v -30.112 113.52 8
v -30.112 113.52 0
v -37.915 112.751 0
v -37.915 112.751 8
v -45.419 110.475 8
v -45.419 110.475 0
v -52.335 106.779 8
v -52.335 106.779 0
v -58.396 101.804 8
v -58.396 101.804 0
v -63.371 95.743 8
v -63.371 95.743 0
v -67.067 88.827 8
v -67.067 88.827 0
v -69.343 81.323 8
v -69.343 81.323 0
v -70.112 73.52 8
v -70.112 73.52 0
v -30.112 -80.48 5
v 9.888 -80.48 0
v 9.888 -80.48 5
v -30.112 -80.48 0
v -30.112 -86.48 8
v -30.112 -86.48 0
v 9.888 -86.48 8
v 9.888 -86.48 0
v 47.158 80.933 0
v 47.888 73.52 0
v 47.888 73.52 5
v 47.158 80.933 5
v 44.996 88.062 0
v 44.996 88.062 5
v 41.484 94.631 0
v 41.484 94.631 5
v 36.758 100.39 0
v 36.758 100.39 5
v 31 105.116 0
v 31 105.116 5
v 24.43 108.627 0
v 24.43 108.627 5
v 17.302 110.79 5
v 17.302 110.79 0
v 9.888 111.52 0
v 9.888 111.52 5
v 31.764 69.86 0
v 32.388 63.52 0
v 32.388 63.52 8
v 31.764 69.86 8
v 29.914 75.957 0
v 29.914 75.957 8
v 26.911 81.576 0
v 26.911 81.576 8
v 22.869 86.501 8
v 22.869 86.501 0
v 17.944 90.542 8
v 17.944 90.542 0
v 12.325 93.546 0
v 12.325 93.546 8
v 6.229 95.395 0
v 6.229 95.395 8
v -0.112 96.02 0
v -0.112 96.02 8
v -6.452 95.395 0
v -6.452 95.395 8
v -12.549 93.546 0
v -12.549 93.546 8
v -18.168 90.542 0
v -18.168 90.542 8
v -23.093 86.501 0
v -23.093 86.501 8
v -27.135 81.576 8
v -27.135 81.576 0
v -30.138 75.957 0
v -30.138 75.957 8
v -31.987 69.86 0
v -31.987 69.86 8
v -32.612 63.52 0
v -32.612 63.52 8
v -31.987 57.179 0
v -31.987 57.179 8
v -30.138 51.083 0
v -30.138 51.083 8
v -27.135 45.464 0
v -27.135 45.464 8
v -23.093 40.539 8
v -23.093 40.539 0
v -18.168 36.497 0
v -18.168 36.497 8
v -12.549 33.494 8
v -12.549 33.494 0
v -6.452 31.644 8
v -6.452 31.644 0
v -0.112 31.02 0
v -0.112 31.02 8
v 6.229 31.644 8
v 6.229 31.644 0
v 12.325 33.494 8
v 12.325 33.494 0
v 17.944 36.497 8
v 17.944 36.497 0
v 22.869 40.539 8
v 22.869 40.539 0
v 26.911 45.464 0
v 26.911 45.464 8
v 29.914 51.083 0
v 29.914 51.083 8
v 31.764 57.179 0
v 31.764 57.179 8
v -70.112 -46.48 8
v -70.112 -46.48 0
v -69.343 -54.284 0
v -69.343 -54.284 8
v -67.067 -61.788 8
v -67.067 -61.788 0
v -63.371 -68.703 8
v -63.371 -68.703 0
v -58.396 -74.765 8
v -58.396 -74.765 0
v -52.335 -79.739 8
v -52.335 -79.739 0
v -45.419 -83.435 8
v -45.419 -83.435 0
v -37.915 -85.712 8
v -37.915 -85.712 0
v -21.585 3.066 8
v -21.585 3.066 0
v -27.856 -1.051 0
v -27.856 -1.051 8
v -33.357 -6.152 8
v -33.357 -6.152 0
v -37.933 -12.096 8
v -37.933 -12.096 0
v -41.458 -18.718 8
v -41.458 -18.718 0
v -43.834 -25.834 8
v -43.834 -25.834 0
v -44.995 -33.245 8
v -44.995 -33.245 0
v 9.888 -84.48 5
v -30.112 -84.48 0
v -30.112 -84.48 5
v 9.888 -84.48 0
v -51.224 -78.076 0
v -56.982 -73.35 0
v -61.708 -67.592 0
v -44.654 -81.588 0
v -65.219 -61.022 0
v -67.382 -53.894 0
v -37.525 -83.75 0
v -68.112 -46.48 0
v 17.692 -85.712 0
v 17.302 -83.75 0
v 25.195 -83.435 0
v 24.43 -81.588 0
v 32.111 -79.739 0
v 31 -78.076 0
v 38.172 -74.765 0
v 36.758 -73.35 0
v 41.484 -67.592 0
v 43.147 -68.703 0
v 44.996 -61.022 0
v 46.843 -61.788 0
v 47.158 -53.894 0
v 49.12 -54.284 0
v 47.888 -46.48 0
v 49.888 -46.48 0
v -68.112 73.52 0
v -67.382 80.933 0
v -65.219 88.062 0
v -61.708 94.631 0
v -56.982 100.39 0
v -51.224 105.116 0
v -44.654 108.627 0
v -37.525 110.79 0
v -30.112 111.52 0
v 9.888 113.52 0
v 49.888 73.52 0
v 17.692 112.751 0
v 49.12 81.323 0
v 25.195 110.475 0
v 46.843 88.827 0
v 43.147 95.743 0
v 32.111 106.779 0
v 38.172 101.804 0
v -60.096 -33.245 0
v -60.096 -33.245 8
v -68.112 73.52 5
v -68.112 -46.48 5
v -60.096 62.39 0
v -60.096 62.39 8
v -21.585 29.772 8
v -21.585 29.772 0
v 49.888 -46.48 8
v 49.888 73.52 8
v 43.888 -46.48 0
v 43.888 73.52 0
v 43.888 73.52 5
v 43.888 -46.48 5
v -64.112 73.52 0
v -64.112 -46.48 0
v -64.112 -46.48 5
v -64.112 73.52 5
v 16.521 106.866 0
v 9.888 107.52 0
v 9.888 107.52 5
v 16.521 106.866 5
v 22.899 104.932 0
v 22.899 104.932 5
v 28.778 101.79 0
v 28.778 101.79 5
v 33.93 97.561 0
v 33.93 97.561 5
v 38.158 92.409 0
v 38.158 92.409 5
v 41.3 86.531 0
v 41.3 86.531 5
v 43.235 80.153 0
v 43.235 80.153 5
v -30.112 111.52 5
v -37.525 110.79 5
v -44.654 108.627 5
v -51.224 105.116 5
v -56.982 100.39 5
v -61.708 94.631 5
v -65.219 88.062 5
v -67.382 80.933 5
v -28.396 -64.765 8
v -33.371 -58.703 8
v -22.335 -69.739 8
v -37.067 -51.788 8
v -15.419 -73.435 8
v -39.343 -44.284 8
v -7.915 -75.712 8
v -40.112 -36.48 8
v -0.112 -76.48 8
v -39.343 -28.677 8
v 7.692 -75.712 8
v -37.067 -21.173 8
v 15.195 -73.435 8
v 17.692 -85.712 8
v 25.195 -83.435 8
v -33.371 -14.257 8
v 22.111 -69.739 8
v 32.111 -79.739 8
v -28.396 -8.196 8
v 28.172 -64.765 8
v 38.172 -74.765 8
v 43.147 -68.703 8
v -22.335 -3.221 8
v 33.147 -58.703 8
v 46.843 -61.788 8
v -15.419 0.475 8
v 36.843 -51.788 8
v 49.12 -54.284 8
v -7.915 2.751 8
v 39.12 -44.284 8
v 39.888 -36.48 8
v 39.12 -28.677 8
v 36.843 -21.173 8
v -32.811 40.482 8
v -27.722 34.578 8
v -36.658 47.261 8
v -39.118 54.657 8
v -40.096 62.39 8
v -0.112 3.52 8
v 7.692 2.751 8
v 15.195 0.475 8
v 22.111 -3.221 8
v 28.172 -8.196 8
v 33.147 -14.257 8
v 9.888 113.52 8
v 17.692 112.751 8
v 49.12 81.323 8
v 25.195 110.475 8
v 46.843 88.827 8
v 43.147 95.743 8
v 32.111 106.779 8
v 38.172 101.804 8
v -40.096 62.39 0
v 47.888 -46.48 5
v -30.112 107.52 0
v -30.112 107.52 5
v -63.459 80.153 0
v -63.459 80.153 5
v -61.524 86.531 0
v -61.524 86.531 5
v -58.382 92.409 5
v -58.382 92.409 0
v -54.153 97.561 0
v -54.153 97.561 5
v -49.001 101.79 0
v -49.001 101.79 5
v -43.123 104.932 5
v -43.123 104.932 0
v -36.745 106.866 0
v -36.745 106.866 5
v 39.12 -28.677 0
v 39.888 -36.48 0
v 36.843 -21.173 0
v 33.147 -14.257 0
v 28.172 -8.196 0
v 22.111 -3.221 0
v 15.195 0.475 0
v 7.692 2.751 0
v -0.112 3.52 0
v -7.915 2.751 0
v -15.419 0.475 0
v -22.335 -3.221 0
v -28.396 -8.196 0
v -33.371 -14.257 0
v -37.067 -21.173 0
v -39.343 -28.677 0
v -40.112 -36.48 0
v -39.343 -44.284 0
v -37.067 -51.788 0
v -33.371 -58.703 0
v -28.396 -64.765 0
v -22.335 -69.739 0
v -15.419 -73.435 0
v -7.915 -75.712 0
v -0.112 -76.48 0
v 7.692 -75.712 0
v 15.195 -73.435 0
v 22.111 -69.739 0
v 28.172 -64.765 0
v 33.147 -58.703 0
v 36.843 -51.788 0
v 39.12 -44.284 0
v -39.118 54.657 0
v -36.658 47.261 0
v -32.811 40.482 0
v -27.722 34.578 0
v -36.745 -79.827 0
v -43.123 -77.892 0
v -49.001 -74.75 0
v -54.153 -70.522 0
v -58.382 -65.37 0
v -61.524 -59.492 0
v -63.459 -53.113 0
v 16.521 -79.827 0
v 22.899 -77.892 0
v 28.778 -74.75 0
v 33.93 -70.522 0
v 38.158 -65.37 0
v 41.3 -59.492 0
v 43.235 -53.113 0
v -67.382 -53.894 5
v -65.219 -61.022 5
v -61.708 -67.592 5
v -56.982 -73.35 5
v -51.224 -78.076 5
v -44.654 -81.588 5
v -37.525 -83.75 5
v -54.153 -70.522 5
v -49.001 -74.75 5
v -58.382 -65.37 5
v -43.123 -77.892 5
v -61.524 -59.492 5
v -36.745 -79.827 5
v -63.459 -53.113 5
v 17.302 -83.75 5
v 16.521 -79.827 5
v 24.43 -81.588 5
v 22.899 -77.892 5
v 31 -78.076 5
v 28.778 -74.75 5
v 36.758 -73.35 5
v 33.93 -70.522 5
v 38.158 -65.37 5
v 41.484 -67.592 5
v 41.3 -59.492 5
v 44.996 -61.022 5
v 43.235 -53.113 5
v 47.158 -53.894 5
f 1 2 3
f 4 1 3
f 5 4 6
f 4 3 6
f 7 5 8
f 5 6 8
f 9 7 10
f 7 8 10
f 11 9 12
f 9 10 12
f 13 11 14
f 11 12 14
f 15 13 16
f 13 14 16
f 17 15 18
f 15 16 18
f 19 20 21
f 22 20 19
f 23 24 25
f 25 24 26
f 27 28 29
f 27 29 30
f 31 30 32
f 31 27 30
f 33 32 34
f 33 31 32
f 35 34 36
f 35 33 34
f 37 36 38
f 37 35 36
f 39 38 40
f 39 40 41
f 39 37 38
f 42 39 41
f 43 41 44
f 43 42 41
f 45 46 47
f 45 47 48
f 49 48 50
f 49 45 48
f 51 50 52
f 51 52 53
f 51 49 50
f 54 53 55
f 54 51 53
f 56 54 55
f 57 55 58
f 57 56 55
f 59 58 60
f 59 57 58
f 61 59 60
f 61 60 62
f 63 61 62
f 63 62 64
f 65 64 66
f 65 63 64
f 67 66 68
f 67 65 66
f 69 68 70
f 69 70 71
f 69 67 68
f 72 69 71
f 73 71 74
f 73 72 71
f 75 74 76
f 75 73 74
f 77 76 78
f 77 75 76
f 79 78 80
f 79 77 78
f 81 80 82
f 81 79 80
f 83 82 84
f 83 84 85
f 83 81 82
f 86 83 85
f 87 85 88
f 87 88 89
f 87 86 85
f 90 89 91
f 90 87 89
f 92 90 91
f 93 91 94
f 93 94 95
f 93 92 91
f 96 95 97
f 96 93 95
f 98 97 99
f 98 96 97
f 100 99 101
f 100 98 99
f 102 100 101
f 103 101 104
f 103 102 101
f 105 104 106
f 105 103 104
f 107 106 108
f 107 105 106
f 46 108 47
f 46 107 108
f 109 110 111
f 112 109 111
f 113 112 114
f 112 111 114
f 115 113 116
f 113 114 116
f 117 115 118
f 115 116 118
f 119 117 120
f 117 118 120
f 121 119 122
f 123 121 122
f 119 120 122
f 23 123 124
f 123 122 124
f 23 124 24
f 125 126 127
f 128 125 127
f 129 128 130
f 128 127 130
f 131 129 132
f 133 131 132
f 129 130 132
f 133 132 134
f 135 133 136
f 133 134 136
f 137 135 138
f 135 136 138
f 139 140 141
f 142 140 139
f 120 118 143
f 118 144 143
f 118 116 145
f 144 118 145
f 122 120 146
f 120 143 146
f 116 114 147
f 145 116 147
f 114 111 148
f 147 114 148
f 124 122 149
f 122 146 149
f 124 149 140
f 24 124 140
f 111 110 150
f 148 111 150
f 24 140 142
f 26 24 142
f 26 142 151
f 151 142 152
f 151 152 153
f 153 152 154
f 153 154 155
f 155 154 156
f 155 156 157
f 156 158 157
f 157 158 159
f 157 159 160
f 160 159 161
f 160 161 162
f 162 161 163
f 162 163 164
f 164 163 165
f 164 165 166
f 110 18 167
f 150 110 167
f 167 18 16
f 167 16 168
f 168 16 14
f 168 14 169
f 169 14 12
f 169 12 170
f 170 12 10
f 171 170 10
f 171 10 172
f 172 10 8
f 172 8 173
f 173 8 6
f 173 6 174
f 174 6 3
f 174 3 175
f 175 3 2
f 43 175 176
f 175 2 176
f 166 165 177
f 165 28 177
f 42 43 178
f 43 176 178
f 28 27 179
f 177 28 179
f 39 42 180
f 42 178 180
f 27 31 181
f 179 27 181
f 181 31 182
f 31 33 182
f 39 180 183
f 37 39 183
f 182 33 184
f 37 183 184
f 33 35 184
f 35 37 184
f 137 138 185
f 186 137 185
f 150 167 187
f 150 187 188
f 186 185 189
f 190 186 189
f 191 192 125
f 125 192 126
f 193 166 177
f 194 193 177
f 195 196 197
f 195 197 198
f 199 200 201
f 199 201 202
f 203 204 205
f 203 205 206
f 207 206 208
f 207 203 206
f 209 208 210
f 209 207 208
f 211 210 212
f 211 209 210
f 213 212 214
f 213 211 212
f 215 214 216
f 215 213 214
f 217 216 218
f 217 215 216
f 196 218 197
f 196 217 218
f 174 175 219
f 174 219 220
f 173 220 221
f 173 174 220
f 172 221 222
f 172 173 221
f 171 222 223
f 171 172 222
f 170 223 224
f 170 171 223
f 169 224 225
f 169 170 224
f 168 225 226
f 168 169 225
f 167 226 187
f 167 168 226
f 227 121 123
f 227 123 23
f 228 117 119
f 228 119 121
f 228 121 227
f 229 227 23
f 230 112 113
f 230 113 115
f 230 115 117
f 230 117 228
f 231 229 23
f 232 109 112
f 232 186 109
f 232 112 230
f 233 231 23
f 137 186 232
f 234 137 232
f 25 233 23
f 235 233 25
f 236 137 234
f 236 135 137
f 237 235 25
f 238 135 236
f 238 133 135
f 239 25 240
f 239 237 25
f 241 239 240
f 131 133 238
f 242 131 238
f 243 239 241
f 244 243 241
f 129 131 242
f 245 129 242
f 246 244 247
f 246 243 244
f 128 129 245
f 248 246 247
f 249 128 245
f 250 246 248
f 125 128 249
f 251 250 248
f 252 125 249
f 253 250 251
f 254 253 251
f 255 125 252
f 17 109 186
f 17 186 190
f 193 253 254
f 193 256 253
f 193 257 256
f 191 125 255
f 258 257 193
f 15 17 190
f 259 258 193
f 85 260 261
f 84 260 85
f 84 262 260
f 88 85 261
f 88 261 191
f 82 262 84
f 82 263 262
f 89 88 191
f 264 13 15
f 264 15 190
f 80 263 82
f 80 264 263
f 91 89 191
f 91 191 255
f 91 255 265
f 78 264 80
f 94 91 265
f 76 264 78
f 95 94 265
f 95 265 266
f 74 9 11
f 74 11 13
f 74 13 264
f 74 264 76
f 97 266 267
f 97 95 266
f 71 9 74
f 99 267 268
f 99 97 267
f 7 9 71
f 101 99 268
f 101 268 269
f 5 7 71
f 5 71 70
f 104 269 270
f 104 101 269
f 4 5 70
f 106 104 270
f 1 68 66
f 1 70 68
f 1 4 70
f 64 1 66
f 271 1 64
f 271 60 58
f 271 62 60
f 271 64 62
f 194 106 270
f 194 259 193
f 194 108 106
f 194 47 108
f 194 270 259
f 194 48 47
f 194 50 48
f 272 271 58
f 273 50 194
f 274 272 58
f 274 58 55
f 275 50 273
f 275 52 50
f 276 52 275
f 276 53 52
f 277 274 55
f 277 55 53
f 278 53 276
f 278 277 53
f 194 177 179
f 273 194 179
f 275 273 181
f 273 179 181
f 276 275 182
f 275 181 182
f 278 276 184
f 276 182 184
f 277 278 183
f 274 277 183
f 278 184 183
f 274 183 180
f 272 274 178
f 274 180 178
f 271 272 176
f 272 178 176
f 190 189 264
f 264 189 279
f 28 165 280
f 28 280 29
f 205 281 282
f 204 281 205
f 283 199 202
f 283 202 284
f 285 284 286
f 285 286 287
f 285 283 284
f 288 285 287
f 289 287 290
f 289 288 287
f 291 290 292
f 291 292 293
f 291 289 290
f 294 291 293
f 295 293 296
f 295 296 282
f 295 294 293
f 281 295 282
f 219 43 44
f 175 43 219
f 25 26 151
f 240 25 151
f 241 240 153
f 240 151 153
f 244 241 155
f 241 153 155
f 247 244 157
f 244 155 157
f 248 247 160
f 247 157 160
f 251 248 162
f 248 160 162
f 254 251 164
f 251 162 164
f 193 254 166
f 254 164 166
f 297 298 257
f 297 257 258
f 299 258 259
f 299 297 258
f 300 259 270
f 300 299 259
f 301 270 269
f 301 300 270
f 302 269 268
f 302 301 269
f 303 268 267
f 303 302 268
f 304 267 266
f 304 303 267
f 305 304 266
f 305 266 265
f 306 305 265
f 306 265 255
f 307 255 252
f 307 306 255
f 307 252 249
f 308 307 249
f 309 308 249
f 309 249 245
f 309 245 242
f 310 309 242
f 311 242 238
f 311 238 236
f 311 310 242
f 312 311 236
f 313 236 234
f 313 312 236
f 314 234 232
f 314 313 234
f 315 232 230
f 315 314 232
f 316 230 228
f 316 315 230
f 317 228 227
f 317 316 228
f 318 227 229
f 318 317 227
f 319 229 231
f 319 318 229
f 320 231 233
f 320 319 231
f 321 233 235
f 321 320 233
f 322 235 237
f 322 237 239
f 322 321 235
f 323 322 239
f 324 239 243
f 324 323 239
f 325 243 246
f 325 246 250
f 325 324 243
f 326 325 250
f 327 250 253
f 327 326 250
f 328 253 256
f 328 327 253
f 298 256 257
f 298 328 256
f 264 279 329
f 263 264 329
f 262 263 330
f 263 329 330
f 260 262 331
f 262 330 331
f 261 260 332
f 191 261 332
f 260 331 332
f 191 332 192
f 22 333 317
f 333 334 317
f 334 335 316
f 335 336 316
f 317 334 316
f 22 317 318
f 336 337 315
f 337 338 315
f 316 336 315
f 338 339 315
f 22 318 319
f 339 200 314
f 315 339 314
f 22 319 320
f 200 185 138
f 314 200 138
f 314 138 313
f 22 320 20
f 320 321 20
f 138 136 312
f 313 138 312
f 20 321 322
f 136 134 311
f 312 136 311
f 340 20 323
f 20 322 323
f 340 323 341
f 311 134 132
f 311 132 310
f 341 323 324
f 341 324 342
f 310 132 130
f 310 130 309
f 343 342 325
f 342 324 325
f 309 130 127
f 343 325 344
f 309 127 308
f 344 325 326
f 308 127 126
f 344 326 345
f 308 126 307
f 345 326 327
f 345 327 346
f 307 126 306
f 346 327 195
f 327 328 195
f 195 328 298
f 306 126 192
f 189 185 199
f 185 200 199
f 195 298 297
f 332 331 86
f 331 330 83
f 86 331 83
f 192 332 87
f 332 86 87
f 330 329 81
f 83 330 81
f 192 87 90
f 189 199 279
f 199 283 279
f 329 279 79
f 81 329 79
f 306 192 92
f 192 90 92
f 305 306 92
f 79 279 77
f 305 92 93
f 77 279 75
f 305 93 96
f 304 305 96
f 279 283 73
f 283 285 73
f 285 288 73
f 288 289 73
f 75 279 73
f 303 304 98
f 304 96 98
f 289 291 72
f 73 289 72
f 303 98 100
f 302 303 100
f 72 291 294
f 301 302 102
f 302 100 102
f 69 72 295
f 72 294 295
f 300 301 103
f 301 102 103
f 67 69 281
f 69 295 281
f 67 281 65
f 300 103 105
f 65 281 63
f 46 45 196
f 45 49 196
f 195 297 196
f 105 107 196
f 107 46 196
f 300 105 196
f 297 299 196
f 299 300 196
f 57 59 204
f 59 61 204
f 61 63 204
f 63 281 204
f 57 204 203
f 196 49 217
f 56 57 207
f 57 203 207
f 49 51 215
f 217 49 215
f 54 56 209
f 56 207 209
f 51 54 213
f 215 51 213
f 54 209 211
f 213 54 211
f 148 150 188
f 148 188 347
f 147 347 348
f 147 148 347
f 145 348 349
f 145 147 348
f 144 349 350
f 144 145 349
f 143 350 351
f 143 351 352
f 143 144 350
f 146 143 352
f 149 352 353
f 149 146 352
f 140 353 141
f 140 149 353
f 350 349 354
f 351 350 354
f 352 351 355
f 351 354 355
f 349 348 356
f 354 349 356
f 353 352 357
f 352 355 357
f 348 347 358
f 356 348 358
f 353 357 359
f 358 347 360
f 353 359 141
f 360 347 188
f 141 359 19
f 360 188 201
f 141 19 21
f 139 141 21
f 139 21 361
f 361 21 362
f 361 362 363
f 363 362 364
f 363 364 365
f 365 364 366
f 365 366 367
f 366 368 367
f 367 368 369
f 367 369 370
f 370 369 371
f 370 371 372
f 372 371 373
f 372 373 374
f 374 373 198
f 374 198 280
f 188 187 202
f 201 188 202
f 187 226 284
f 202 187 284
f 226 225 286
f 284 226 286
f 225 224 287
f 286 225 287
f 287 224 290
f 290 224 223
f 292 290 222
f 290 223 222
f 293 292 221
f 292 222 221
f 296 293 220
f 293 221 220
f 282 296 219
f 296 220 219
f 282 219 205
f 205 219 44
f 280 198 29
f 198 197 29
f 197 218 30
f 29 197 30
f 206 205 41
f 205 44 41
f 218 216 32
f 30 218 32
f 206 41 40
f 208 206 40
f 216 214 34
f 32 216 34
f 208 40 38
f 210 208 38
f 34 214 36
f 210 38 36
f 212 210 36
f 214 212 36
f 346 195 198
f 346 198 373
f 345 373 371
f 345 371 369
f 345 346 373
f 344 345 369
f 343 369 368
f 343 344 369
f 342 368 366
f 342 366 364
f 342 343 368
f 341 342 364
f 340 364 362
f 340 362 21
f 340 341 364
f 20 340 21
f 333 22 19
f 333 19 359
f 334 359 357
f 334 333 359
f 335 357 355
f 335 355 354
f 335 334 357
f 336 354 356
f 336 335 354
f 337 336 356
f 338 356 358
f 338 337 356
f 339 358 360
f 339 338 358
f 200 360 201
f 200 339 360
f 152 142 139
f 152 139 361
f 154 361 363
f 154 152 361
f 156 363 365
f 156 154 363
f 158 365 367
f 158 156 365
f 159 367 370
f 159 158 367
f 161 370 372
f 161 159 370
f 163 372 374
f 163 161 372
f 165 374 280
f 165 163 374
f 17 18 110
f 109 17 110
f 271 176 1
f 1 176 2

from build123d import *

# Parameters (mm, degrees)
F0_R     = 40
F0_R_2   = 32.5
F1_DEPTH = 8
F2_DEPTH = 5


with BuildPart() as f1:
    # F0 (on Top) → F1 (new body)
    with BuildSketch(Plane.XY):
        with BuildLine():
            Line((9.88816, 113.519735), (-30.11184, 113.519735))
            ThreePointArc((-30.11184, 113.519735), (-58.396111, 101.804006), (-70.11184, 73.519735))
            Line((-70.11184, 73.519735), (-70.11184, -46.480265))
            ThreePointArc((-70.11184, -46.480265), (-58.396111, -74.764536), (-30.11184, -86.480265))
            Line((-30.11184, -86.480265), (9.88816, -86.480265))
            ThreePointArc((9.88816, -86.480265), (38.172431, -74.764536), (49.88816, -46.480265))
            Line((49.88816, -46.480265), (49.88816, 73.519735))
            ThreePointArc((49.88816, 73.519735), (38.172431, 101.804006), (9.88816, 113.519735))
        make_face()
        with BuildLine():
            ThreePointArc((-68.11184, 73.519735), (-56.981898, 100.389793), (-30.11184, 111.519735))
            Line((-30.11184, 111.519735), (9.88816, 111.519735))
            ThreePointArc((9.88816, 111.519735), (36.758217, 100.389793), (47.88816, 73.519735))
            Line((47.88816, 73.519735), (47.88816, -46.480265))
            ThreePointArc((47.88816, -46.480265), (36.758217, -73.350323), (9.88816, -84.480265))
            Line((9.88816, -84.480265), (-30.11184, -84.480265))
            ThreePointArc((-30.11184, -84.480265), (-56.981898, -73.350323), (-68.11184, -46.480265))
            Line((-68.11184, -46.480265), (-68.11184, 73.519735))
        make_face(mode=Mode.SUBTRACT)
        with BuildLine():
            Line((9.88816, 111.519735), (-30.11184, 111.519735))
            ThreePointArc((-30.11184, 111.519735), (-56.981898, 100.389793), (-68.11184, 73.519735))
            Line((-68.11184, 73.519735), (-68.11184, -46.480265))
            ThreePointArc((-68.11184, -46.480265), (-56.981898, -73.350323), (-30.11184, -84.480265))
            Line((-30.11184, -84.480265), (9.88816, -84.480265))
            ThreePointArc((9.88816, -84.480265), (36.758217, -73.350323), (47.88816, -46.480265))
            Line((47.88816, -46.480265), (47.88816, 73.519735))
            ThreePointArc((47.88816, 73.519735), (36.758217, 100.389793), (9.88816, 111.519735))
        make_face()
        with BuildLine():
            Line((-64.11184, -46.480265), (-64.11184, 73.519735))
            ThreePointArc((-64.11184, 73.519735), (-54.153471, 97.561365), (-30.11184, 107.519735))
            Line((-30.11184, 107.519735), (9.88816, 107.519735))
            ThreePointArc((9.88816, 107.519735), (33.92979, 97.561365), (43.88816, 73.519735))
            Line((43.88816, 73.519735), (43.88816, -46.480265))
            ThreePointArc((43.88816, -46.480265), (33.92979, -70.521896), (9.88816, -80.480265))
            Line((9.88816, -80.480265), (-30.11184, -80.480265))
            ThreePointArc((-30.11184, -80.480265), (-54.153471, -70.521896), (-64.11184, -46.480265))
        make_face(mode=Mode.SUBTRACT)
        with BuildLine():
            ThreePointArc((-30.11184, 107.519735), (-54.153471, 97.561365), (-64.11184, 73.519735))
            Line((-64.11184, 73.519735), (-64.11184, -46.480265))
            ThreePointArc((-64.11184, -46.480265), (-54.153471, -70.521896), (-30.11184, -80.480265))
            Line((-30.11184, -80.480265), (9.88816, -80.480265))
            ThreePointArc((9.88816, -80.480265), (33.92979, -70.521896), (43.88816, -46.480265))
            Line((43.88816, -46.480265), (43.88816, 73.519735))
            ThreePointArc((43.88816, 73.519735), (33.92979, 97.561365), (9.88816, 107.519735))
            Line((9.88816, 107.519735), (-30.11184, 107.519735))
        make_face()
        with Locations((-0.11184, -36.480265)):
            Circle(F0_R, mode=Mode.SUBTRACT)
        with BuildLine():
            Line((-60.095887, 62.39015), (-40.095887, 62.39015))
            ThreePointArc((-40.095887, 62.39015), (-34.900309, 43.777332), (-21.585297, 29.772281))
            Line((-21.585297, 29.772281), (-21.585297, 3.065792))
            ThreePointArc((-21.585297, 3.065792), (-37.93282, -12.096388), (-44.995373, -33.24476))
            Line((-44.995373, -33.24476), (-60.095887, -33.24476))
            Line((-60.095887, -33.24476), (-60.095887, 62.39015))
        make_face(mode=Mode.SUBTRACT)
        with Locations((-0.11184, 63.519735)):
            Circle(F0_R_2, mode=Mode.SUBTRACT)
    extrude(amount=F1_DEPTH)

    # F0 (on Top) → F2 (cut)
    with BuildSketch(Plane.XY):
        with BuildLine():
            Line((9.88816, 111.519735), (-30.11184, 111.519735))
            ThreePointArc((-30.11184, 111.519735), (-56.981898, 100.389793), (-68.11184, 73.519735))
            Line((-68.11184, 73.519735), (-68.11184, -46.480265))
            ThreePointArc((-68.11184, -46.480265), (-56.981898, -73.350323), (-30.11184, -84.480265))
            Line((-30.11184, -84.480265), (9.88816, -84.480265))
            ThreePointArc((9.88816, -84.480265), (36.758217, -73.350323), (47.88816, -46.480265))
            Line((47.88816, -46.480265), (47.88816, 73.519735))
            ThreePointArc((47.88816, 73.519735), (36.758217, 100.389793), (9.88816, 111.519735))
        make_face()
        with BuildLine():
            Line((-64.11184, -46.480265), (-64.11184, 73.519735))
            ThreePointArc((-64.11184, 73.519735), (-54.153471, 97.561365), (-30.11184, 107.519735))
            Line((-30.11184, 107.519735), (9.88816, 107.519735))
            ThreePointArc((9.88816, 107.519735), (33.92979, 97.561365), (43.88816, 73.519735))
            Line((43.88816, 73.519735), (43.88816, -46.480265))
            ThreePointArc((43.88816, -46.480265), (33.92979, -70.521896), (9.88816, -80.480265))
            Line((9.88816, -80.480265), (-30.11184, -80.480265))
            ThreePointArc((-30.11184, -80.480265), (-54.153471, -70.521896), (-64.11184, -46.480265))
        make_face(mode=Mode.SUBTRACT)
    extrude(amount=F2_DEPTH, mode=Mode.SUBTRACT)


solid = f1.part
